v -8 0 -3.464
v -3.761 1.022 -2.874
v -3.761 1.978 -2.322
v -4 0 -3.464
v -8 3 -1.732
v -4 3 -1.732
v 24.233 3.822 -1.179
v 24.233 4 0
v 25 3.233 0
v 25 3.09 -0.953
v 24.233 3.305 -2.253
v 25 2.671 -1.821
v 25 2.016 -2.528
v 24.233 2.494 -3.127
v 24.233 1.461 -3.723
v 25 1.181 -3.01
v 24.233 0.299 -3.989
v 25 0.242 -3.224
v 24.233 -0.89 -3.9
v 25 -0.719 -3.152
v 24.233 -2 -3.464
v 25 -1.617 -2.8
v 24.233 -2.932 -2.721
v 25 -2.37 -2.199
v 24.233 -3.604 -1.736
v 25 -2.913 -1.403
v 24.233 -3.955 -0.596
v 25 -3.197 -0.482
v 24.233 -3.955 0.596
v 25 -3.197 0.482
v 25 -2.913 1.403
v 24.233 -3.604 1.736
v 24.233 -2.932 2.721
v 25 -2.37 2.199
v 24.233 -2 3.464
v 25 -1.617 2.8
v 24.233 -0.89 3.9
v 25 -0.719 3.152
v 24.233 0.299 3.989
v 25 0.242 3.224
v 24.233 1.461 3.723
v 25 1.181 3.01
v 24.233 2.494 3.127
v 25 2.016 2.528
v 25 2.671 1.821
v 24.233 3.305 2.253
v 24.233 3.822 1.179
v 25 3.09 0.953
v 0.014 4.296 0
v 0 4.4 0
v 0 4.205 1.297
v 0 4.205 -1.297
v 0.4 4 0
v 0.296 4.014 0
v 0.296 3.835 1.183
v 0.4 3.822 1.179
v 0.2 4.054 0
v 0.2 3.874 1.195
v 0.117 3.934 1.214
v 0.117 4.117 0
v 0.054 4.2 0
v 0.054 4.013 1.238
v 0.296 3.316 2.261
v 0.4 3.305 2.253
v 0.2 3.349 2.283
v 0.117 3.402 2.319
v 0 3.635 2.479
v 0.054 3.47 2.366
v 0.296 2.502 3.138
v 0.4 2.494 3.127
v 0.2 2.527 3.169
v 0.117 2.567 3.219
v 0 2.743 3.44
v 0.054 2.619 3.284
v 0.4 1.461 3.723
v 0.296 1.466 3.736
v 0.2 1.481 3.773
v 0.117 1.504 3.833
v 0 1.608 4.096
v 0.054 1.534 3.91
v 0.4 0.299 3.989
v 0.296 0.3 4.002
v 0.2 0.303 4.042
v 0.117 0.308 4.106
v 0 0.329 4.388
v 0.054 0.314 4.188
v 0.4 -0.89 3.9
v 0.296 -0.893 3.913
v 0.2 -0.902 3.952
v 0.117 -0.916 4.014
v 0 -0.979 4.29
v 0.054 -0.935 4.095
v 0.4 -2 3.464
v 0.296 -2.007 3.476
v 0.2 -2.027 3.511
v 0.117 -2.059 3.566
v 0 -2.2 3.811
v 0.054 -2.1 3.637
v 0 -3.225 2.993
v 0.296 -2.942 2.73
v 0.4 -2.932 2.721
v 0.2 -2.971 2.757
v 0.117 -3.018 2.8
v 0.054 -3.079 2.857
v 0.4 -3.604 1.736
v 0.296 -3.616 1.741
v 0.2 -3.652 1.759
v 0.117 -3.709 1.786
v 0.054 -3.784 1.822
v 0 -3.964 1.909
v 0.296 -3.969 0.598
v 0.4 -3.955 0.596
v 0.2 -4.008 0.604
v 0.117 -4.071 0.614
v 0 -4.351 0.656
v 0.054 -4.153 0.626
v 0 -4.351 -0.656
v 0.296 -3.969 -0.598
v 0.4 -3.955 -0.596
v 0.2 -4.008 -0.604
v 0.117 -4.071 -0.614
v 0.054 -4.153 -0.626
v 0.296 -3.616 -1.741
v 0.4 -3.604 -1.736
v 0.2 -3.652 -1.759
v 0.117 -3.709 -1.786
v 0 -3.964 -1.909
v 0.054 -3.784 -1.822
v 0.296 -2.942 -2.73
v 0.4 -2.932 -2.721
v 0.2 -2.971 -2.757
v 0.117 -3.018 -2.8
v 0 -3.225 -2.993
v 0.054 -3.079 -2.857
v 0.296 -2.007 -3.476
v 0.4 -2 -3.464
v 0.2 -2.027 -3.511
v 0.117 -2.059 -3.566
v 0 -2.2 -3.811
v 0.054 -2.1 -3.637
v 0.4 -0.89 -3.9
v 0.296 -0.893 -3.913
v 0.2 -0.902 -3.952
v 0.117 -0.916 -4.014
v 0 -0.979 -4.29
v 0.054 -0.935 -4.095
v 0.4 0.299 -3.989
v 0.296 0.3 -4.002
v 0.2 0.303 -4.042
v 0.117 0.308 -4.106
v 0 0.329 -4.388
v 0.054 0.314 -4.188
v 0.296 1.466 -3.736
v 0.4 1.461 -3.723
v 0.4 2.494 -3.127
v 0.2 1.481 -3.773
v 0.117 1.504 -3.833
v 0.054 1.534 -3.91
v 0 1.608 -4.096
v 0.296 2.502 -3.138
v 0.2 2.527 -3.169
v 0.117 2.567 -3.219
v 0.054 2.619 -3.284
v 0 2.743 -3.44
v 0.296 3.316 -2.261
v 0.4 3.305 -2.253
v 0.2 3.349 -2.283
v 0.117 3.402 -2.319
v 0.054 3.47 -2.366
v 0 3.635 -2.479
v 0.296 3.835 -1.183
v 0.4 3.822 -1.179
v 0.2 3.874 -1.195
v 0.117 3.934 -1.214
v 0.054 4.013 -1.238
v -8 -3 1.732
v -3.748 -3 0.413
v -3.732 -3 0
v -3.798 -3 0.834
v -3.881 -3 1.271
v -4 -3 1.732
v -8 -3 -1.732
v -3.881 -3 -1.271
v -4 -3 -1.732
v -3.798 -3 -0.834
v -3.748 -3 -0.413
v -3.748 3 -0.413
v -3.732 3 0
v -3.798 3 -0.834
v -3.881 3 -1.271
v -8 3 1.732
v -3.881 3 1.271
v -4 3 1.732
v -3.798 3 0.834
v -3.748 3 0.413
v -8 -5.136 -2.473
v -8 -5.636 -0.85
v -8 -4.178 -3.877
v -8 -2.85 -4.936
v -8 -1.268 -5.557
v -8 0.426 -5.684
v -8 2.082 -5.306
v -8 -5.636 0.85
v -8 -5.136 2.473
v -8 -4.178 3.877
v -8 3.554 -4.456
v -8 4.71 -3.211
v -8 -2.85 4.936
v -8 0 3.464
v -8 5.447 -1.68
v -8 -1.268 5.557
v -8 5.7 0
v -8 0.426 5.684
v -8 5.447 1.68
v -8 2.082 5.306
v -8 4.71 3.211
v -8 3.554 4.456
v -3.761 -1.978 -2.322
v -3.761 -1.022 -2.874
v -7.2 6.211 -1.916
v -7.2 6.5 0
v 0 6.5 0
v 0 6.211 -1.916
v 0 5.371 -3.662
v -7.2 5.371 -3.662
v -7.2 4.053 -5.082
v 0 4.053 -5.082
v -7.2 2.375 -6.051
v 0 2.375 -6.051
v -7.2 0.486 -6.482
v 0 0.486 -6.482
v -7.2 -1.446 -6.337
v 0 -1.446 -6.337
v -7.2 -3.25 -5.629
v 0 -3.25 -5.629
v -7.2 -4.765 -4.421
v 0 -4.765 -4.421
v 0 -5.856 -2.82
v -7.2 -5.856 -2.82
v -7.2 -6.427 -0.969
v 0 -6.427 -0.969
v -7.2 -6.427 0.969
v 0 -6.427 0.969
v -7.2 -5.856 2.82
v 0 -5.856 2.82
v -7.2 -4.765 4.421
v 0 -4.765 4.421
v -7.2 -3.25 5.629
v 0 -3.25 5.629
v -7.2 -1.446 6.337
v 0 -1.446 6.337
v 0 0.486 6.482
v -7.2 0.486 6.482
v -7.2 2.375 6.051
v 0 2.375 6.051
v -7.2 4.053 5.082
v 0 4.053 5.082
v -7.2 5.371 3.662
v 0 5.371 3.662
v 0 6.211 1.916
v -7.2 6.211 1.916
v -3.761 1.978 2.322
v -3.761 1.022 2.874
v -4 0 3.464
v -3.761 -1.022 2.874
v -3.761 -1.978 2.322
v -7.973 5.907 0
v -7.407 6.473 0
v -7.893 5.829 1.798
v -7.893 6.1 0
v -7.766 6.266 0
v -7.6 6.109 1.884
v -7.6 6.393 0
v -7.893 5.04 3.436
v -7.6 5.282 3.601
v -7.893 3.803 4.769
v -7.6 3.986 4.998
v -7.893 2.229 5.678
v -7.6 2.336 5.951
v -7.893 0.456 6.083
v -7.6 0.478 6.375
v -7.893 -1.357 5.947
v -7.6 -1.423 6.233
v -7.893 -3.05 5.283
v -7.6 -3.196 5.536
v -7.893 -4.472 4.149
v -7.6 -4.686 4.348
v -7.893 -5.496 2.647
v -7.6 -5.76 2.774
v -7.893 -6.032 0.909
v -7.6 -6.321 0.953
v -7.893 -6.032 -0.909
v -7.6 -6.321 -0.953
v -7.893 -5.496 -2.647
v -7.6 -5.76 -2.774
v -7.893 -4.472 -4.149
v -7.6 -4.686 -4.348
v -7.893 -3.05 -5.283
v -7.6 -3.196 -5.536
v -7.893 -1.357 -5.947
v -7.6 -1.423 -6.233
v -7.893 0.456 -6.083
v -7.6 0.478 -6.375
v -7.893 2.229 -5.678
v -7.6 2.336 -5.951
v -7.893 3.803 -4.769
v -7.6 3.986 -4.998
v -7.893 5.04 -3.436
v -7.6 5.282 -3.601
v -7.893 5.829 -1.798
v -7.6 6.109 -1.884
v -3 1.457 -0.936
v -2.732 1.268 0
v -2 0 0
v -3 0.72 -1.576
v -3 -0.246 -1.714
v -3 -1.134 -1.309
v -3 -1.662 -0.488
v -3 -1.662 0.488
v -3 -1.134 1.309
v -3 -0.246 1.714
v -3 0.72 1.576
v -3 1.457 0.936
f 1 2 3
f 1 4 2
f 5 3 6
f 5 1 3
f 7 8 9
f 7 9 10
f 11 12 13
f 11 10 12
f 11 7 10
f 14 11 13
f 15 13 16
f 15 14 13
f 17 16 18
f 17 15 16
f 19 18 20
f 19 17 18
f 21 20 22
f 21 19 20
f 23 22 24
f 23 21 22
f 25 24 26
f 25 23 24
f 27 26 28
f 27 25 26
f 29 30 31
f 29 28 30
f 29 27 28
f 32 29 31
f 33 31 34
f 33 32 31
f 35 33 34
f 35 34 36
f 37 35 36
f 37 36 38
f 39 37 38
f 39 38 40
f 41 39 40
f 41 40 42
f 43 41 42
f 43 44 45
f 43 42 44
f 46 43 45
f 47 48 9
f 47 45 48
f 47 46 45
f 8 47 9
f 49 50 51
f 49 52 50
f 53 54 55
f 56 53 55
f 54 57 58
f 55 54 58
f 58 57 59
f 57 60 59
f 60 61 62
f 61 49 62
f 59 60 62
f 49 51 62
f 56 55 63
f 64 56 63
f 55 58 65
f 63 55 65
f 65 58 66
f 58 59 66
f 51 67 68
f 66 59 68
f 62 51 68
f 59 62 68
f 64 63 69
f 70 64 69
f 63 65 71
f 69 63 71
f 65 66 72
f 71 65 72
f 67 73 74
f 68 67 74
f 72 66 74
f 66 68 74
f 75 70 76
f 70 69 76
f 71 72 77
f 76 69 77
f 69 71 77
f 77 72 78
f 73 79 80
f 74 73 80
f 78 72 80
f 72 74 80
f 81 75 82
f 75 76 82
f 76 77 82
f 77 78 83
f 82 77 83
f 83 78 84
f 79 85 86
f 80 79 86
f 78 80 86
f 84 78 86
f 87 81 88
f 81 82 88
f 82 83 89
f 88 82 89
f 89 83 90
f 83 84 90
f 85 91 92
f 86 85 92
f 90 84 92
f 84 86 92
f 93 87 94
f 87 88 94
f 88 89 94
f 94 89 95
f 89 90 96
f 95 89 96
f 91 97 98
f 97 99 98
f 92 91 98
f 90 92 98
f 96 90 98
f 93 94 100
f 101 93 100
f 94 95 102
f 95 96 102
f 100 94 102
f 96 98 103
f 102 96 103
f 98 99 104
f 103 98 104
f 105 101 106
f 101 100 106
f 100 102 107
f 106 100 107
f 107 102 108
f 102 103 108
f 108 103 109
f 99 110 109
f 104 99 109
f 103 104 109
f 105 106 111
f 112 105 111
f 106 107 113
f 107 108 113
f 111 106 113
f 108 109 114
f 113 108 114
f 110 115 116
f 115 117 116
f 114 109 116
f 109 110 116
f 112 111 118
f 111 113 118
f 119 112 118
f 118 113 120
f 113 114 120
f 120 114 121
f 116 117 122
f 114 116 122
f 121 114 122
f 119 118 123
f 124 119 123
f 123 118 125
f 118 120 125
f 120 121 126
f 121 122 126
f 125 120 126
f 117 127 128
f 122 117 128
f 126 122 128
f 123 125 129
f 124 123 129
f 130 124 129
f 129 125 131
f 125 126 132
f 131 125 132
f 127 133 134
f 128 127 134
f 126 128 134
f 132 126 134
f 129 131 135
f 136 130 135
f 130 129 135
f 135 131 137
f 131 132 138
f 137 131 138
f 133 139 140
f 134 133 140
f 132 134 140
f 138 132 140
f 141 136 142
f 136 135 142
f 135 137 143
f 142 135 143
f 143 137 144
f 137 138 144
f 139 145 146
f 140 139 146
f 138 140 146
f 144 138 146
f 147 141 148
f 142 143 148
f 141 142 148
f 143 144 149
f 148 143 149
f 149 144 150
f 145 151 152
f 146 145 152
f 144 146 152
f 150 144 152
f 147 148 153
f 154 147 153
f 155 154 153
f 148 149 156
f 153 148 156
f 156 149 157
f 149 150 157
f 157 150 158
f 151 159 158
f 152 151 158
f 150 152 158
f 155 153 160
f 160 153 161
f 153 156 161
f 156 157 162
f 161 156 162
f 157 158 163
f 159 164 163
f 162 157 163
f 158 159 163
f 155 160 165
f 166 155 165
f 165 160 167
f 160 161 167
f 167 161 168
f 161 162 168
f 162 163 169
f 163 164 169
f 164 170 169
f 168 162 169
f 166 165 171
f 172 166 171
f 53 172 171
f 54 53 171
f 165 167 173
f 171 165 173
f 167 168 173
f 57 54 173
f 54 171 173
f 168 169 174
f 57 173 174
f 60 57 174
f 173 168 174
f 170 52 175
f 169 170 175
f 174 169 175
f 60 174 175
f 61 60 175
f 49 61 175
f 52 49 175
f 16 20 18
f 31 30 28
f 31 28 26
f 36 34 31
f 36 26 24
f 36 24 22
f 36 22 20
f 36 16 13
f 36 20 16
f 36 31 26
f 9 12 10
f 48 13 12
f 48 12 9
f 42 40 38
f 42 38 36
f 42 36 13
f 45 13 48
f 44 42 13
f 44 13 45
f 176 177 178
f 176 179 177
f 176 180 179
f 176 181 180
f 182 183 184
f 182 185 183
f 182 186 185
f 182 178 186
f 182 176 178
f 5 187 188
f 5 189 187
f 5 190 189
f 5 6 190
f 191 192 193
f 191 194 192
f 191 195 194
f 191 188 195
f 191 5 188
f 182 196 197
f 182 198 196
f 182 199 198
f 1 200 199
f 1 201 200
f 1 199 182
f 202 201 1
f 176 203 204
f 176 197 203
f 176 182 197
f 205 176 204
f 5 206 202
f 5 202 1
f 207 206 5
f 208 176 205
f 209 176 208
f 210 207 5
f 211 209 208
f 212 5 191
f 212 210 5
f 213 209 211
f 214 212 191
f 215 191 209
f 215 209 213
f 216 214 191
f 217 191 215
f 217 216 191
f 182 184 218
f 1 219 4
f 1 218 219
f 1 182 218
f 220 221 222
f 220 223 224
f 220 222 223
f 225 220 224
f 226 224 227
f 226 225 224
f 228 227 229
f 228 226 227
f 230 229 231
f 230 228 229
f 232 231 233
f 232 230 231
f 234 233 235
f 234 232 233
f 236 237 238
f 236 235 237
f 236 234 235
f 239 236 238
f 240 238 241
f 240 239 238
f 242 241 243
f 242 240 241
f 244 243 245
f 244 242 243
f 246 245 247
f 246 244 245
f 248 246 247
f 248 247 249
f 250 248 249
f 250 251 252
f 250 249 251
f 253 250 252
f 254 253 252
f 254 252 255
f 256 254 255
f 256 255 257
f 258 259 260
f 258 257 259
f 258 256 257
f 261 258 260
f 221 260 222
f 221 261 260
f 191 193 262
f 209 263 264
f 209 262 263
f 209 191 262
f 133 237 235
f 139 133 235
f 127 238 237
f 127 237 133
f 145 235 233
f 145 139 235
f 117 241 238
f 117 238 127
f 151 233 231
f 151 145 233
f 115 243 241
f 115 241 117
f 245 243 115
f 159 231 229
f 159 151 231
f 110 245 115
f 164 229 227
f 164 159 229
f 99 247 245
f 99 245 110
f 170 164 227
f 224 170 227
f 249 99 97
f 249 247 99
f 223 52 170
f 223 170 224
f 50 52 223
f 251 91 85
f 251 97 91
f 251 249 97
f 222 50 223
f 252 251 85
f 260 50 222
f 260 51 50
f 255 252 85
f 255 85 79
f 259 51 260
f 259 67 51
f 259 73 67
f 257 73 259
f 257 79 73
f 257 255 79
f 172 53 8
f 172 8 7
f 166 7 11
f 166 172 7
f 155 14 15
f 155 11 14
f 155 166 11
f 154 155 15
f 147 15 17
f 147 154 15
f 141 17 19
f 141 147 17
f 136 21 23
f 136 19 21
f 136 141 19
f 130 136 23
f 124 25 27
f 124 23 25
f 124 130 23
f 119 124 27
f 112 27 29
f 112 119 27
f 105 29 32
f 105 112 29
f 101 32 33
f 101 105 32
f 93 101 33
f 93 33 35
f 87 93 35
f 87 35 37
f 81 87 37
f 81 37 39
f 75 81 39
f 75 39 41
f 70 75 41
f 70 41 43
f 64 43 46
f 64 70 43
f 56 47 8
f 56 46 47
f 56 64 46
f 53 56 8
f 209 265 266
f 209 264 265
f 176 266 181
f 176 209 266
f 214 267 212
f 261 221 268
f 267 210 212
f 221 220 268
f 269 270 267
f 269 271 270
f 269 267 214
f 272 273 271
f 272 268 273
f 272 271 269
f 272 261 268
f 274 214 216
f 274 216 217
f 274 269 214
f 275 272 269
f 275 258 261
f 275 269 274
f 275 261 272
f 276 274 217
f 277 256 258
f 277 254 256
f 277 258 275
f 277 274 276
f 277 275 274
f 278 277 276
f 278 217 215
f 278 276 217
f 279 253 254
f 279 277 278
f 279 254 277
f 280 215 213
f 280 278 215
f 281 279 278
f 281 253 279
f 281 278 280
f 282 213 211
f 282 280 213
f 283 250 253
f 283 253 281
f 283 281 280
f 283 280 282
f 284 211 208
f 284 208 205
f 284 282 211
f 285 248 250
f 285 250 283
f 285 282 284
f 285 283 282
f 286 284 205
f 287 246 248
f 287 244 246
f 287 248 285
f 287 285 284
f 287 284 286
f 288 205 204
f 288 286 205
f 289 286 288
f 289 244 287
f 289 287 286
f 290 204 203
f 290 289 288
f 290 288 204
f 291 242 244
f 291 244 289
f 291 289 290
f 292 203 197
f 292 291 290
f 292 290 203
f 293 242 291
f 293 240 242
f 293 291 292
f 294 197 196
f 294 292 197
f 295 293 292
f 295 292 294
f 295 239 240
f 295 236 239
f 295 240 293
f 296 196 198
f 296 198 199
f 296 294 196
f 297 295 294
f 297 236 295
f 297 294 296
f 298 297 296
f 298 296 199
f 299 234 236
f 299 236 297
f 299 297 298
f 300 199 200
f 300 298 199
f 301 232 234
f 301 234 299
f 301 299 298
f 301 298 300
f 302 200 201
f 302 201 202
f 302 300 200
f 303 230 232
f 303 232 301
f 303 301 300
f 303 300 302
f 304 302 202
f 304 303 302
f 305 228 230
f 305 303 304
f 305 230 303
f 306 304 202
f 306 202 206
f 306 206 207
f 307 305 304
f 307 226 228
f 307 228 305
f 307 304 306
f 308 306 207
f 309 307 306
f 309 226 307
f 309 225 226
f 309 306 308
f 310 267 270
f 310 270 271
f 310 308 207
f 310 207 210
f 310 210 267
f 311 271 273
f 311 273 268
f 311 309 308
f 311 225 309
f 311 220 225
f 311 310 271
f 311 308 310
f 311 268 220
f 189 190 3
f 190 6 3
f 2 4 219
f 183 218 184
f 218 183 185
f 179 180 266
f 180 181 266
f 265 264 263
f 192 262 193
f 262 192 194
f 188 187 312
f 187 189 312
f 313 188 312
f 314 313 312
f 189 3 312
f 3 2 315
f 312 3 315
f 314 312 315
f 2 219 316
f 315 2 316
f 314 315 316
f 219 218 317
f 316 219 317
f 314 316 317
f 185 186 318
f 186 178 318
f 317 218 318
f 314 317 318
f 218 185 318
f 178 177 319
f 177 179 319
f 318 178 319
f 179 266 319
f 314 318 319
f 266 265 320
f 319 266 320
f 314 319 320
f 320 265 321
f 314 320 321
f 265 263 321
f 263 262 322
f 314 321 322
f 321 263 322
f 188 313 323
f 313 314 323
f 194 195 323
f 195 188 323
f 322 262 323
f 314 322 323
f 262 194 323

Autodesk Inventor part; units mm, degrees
ref_plane "YZ Plane" through (0, 0, 0) normal (1, 0, 0) x (0, 1, 0)
ref_plane "XZ Plane" through (0, 0, 0) normal (0, 1, 0) x (-1, 0, 0)
sketch "Sketch1" plane through (0, 0, 0) normal (0, 0, 1) x (1, 0, 0)
  line L0 (-2, 0) -> (25, 0)
  line L1 (25, 0) -> (25, 4)
  line L2 (25, 4) -> (3.125, 4)
  line L3 (3.125, 4) -> (2.3581, 4)
  line L4 (2.3581, 4) -> (0, 4)
  line L5 (0, 4) -> (0, 6.5)
  line L6 (0, 6.5) -> (-8, 6.5)
  line L7 (-8, 6.5) -> (-8, 3.4641)
  line L8 (-8, 3.4641) -> (-4, 3.4641)
  line L9 (-4, 3.4641) -> (-2, 0)
  line L10 (-14.6, 0) -> (31.6, 0) projected
  line L11 (0, -1.3) -> (0, 7.8) projected
  line L12 (3.125, 4) -> (0, 4) construction
  dimension "d1" = 21.875
  dimension "d2" = 0.7669
  dimension "d3" = 8
  dimension "d4" = 4
  dimension "d5" = 60
  dimension "d6" = 8
  dimension "d7" = 8
  dimension "d8" = 6.9282
  dimension "d9" = 13
  dimension "d26" = 25
revolve "Body" add sketch "Sketch1" angle 360 about axis through (-2, 0, 0) along (1, 0, 0)
sketch "Sketch2" plane through (-8, 0, 0) normal (-1, 0, 0) x (0, 0, 1)
  circle A0 centre (0, 0) radius 3.4641 projected
  line L0 (0, -9.1) -> (0, 9.1) projected
  line L1 (-9.1, 0) -> (9.1, 0) projected
  line L2 (3.4641, 0) -> (1.7321, -3)
  line L3 (1.7321, -3) -> (-1.7321, -3)
  line L4 (-1.7321, -3) -> (-3.4641, 0)
  line L5 (-3.4641, 0) -> (-1.7321, 3)
  line L6 (-1.7321, 3) -> (1.7321, 3)
  line L7 (1.7321, 3) -> (3.4641, 0)
extrude "Slot" add sketch "Sketch2" against normal up to next contours L7 A0 | A0 L2 | L6 L0 A0 | A0 L0 L3 | L0 L6 A0 | A0 L3 L0 | L4 A0 | A0 L5
fillet "Fillet1" radius 0.8 1 edges at (-8, -6.5, 0)
thread "Thread" size "M8x1.25" class "6g" standard "ISO Metric profile" length 21.875
chamfer "Chamfer1" distance 0.7668 distance2 0.7668 1 edges at (25, -4, 0) measured on face at (25, -0.6859, 0.8072)
ref_plane "Work Plane1" through (29, 0, 0) normal (0, -1, 0) x (1, 0, 0)
fillet "Fillet2" radius 0.4 1 edges at (0, -4, 0)
equation "\"d1\" = GEL"
equation "\"d3\" = KOH"
equation "\"d4\" = INTI"
equation "\"d6\" = GD"
equation "\"d7\" = BDM"
equation "\"d8\" = 1.1547 * SW"
equation "\"d9\" = KOD"
equation "\"d26\" = NLG"
equation "\"d30\" = R"
equation "\"d17\" = RR"
equation "\"d13\" = GEL"
equation "\"d15\" = -0.5 * SPD + 0.5 * GD"
equation "\"d16\" = GUL"
equation "\"GD\" = NND"
equation "\"NLG\" = 25"
equation "\"GEL\" = 21.875"
equation "\"KOD\" = 13"
equation "\"KOH\" = 8"
equation "\"INTI\" = 4"
equation "\"GAL\" = 0.61345 * PTC"
equation "\"GUL\" = 0.61345 * PTC"
equation "\"BDM\" = NND"
equation "\"SW\" = 6"
equation "\"RR\" = 0.8"
equation "\"SPD\" = NND - 1.2269 * PTC"
equation "\"R\" = 0.4"
equation "\"TOA\" = 30deg"
equation "\"GD1\" = THREADDIA - 1.2269 * PTC"
equation "\"THREADDIA\" = 8"
equation "\"FAWI\" = 45deg"
equation "\"ANG\" = 120deg"
equation "\"PTC\" = 1.25"
equation "\"NND\" = 8"
equation "\"E0\" = 1.155 * SW"
properties part number "Allen Key 8x25mm" material "Steel, Mild"
